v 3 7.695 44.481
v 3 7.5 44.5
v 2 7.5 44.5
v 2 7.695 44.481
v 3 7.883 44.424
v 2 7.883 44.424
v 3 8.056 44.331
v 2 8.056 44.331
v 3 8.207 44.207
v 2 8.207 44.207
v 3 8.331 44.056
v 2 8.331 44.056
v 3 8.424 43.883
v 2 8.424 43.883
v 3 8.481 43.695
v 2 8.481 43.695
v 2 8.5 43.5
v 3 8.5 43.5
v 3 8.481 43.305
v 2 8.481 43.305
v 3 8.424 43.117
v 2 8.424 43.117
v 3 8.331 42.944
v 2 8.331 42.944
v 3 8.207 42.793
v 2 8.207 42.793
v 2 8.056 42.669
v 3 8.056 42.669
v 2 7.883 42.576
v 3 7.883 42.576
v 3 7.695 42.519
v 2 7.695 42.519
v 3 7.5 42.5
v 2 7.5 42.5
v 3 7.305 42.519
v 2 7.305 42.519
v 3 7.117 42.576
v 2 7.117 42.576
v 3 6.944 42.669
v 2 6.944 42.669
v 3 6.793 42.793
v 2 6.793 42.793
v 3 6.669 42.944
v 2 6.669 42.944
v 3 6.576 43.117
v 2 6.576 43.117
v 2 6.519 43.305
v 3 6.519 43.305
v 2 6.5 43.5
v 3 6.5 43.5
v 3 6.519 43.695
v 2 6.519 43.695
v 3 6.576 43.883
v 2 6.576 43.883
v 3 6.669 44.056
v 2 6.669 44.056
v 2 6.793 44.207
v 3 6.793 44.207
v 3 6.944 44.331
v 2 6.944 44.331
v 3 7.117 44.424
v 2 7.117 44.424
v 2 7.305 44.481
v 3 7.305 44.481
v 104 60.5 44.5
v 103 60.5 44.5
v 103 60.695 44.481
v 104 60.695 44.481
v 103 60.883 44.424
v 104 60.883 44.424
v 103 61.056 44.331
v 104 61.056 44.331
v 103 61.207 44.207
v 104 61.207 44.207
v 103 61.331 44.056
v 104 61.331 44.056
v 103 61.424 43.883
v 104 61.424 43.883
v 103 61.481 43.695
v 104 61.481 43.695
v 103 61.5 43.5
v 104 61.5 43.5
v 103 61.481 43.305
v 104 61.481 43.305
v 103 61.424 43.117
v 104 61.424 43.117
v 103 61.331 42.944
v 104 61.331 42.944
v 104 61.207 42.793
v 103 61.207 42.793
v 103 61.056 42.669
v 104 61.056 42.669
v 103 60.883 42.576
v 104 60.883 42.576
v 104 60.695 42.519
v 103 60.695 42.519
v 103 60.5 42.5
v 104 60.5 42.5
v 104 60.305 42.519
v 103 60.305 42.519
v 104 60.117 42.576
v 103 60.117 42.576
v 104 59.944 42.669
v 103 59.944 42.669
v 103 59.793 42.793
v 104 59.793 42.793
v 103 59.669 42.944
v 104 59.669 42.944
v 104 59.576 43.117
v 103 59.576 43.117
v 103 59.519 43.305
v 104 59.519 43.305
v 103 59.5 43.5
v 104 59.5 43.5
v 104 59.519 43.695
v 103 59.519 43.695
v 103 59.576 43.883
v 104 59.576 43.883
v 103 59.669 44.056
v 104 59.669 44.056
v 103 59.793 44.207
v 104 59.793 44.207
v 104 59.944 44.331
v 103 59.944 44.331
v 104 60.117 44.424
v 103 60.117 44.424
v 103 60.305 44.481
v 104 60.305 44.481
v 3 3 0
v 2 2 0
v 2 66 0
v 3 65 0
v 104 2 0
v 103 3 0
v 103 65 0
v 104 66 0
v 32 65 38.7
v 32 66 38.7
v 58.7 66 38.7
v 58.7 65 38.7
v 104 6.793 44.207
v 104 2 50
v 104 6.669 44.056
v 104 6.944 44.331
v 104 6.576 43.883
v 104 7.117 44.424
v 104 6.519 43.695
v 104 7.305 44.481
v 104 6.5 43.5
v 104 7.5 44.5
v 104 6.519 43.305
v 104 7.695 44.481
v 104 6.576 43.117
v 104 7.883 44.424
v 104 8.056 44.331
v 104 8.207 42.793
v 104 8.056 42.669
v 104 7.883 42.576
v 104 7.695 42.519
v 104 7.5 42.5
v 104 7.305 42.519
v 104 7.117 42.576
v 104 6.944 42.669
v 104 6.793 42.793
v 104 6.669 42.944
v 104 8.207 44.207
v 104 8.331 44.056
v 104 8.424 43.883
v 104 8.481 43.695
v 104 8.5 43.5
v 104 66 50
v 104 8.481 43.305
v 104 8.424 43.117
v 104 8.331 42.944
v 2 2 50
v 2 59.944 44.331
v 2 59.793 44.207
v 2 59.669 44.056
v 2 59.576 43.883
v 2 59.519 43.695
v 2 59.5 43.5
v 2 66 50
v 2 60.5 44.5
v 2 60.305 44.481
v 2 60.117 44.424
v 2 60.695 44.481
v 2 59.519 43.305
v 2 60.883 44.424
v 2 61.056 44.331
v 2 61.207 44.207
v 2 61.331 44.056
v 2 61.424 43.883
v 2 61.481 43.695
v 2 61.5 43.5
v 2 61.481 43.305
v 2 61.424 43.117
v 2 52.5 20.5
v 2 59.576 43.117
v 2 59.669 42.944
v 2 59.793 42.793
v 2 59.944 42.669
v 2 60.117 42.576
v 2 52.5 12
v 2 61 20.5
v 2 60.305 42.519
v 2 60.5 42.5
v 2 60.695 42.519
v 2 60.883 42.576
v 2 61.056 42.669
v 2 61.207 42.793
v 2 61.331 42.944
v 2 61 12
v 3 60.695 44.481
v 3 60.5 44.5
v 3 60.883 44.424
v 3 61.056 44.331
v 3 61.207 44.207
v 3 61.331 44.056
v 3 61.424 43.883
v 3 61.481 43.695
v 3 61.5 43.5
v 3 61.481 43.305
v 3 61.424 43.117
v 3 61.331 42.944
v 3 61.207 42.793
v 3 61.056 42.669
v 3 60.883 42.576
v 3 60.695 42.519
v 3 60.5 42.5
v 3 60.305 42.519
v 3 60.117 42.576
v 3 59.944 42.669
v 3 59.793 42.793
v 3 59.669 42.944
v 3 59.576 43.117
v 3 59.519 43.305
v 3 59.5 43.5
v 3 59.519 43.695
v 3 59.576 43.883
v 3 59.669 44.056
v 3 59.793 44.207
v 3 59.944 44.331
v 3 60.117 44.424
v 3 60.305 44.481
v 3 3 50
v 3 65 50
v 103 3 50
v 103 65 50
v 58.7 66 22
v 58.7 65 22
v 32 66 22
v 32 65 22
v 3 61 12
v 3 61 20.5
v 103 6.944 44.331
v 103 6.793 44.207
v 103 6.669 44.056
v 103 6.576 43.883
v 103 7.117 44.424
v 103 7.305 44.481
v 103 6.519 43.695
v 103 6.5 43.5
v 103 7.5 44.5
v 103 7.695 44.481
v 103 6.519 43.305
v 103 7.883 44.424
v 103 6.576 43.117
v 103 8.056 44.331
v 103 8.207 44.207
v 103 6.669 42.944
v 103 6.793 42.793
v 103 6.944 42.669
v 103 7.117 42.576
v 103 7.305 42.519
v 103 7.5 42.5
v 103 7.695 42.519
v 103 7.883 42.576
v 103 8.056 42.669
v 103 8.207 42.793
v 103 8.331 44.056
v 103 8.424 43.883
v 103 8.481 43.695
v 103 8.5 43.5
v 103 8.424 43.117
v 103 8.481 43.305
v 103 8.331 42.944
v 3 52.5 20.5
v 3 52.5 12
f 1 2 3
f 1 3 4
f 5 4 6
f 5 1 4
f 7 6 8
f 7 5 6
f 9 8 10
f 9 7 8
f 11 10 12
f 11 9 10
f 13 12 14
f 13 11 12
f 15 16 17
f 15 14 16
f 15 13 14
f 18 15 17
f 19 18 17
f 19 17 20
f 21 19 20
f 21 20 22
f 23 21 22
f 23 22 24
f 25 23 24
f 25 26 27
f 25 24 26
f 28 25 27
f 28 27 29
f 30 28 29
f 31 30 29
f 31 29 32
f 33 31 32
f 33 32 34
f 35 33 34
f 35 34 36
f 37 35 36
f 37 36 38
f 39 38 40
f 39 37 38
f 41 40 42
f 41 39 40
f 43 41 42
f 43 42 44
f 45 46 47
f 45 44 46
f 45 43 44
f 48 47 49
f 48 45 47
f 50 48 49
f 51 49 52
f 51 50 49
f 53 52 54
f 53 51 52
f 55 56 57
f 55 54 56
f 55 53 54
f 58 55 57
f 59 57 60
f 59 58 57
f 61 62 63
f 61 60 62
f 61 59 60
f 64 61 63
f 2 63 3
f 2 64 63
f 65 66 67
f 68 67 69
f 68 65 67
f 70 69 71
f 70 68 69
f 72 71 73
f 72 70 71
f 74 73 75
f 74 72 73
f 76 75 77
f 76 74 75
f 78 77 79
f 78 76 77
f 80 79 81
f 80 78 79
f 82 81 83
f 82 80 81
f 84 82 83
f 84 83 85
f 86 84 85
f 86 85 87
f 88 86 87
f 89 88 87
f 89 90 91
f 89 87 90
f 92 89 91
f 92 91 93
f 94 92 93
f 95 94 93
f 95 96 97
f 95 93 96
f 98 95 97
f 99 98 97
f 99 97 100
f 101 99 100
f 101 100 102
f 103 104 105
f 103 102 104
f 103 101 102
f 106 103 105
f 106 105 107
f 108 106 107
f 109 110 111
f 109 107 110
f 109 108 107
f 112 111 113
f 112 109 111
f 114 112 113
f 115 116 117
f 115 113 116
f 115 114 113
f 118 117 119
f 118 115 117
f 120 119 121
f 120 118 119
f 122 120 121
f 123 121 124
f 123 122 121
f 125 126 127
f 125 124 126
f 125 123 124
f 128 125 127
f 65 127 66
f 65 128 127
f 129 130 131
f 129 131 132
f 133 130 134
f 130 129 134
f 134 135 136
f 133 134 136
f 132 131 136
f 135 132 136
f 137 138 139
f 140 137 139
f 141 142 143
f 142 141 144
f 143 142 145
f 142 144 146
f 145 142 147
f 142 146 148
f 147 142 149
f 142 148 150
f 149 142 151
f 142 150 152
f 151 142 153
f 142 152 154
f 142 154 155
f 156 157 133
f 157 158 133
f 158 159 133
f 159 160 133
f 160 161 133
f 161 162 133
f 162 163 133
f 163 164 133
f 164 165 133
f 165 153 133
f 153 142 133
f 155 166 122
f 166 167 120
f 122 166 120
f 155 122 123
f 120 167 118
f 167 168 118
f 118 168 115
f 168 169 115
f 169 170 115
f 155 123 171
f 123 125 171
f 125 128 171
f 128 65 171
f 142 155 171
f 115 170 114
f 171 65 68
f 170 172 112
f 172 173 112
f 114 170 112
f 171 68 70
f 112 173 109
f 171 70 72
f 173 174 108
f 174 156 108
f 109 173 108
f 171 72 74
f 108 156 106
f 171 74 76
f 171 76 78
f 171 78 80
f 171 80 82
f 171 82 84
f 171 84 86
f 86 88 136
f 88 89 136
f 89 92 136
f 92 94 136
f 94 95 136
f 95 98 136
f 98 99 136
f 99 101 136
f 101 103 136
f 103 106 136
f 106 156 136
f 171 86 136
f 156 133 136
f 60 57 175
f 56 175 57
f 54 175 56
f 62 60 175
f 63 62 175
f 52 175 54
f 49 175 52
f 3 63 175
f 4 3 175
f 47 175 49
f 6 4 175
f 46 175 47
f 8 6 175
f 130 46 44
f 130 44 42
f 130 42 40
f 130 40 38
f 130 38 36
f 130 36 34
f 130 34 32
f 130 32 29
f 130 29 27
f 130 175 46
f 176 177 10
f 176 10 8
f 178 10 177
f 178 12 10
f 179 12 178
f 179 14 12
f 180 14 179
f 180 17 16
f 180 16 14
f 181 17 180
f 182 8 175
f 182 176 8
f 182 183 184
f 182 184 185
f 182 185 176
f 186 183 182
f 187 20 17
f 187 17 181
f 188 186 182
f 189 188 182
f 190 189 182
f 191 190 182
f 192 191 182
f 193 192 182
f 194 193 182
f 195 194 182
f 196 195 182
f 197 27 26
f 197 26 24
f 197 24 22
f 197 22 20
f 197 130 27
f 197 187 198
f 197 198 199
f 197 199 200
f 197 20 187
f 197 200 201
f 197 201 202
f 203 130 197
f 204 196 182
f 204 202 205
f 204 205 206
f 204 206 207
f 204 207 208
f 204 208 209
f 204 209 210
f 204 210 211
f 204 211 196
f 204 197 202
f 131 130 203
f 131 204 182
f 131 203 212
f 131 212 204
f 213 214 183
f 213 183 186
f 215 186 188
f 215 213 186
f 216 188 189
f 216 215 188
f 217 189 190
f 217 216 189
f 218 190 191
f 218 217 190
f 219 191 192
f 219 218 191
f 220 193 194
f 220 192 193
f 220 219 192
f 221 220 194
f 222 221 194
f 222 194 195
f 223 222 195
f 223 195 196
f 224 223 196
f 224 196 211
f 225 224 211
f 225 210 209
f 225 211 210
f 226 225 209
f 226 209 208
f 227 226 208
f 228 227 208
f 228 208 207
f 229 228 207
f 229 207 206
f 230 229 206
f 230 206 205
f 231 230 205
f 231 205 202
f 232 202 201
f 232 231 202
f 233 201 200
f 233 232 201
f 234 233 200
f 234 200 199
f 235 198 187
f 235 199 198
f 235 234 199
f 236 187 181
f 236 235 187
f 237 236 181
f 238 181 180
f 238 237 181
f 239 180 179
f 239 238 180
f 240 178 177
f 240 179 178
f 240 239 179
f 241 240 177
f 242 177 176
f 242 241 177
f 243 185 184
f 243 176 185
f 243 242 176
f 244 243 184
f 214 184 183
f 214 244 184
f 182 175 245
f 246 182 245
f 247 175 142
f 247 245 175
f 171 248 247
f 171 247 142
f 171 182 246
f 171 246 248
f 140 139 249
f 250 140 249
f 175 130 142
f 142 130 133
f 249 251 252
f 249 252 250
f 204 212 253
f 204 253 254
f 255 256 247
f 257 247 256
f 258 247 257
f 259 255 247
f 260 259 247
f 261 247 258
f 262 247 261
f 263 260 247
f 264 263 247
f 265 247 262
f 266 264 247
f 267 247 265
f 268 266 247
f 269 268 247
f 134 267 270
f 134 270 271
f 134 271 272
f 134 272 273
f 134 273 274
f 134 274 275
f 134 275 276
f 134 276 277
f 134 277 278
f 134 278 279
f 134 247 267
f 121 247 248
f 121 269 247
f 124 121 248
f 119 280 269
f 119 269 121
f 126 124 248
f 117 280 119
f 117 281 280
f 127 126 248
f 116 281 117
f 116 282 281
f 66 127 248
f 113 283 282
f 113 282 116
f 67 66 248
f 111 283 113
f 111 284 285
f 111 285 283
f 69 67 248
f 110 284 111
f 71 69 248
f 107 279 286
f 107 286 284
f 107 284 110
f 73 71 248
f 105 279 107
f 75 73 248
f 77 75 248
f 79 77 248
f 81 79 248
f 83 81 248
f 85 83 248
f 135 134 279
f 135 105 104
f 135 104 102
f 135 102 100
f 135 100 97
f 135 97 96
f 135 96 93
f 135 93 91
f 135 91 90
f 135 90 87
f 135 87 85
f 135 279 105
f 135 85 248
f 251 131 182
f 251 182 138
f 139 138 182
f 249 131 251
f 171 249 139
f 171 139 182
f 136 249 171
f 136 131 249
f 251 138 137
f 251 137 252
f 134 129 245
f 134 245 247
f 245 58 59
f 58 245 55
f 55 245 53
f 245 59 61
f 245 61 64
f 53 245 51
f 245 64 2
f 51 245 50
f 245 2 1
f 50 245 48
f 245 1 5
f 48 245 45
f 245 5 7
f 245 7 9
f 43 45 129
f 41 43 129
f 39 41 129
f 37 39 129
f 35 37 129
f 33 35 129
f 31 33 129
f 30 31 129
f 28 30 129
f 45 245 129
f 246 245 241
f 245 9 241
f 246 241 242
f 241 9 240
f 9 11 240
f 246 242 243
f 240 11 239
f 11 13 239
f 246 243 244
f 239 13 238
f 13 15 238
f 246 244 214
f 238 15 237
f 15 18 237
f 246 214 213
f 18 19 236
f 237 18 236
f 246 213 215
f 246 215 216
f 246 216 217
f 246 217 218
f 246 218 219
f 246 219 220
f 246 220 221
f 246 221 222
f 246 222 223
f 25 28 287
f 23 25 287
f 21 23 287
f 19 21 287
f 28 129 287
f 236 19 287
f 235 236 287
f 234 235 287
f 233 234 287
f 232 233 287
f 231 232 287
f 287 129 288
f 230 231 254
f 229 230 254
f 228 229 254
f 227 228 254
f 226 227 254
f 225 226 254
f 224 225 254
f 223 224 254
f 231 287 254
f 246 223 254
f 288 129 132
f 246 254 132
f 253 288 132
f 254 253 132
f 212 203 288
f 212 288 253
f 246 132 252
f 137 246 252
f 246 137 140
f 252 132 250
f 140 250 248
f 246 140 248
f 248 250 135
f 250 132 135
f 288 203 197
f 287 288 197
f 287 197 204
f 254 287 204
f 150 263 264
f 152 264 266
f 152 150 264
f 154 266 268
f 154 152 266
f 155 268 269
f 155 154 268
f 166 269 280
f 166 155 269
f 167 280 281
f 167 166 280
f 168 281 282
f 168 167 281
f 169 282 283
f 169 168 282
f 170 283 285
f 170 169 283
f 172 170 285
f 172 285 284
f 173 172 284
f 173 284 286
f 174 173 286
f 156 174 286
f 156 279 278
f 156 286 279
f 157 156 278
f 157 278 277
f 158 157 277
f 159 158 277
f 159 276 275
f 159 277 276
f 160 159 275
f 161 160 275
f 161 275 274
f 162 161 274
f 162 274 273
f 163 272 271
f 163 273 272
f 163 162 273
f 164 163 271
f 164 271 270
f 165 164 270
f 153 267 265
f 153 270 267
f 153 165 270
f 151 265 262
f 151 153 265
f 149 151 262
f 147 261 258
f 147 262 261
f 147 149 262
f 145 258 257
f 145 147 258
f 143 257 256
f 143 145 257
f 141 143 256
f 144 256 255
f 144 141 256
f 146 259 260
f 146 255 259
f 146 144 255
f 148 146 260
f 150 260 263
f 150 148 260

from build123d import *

# Parameters (mm, degrees)
SKETCH_1_W               = 102
SKETCH_1_H               = 64
SKETCH_1_W_2             = 100
SKETCH_1_H_2             = 62
EXTRUDE_1_DEPTH          = 50
CUT_EXTRUDE_2_DEPTH      = 102
CUT_EXTRUDE_2_DEPTH_BACK = 1
SKETCH_5_R               = 1
SKETCH_7_W               = 8.5
SKETCH_7_H               = 8.5
CUT_EXTRUDE_4_DEPTH      = 10
SKETCH_8_W               = 26.7
SKETCH_8_H               = 16.7
CUT_EXTRUDE_5_DEPTH      = 10


with BuildPart() as part:
    # Эскиз1 → Бобышка-Вытянуть1 (new body)
    with BuildSketch(Plane.XY):
        with Locations((53, 34)):
            Rectangle(SKETCH_1_W, SKETCH_1_H)
        with Locations((53, 34)):
            Rectangle(SKETCH_1_W_2, SKETCH_1_H_2, mode=Mode.SUBTRACT)
    extrude(amount=EXTRUDE_1_DEPTH)

    # Эскиз5 → Вырез-Вытянуть2 (cut, two sides: drawn at the far end of the back side and taken through both)
    with BuildSketch(Plane.ZY.offset(-103).offset(-CUT_EXTRUDE_2_DEPTH_BACK)):
        with Locations((43.5, 7.5)):
            Circle(SKETCH_5_R)
        with Locations((43.5, 60.5)):
            Circle(SKETCH_5_R)
    extrude(amount=CUT_EXTRUDE_2_DEPTH + CUT_EXTRUDE_2_DEPTH_BACK, mode=Mode.SUBTRACT)

    # Эскиз7 → Вырез-Вытянуть4 (cut)
    with BuildSketch(Plane.ZY.offset(-2)):
        with Locations((16.25, 56.75)):
            Rectangle(SKETCH_7_W, SKETCH_7_H)
    extrude(amount=-CUT_EXTRUDE_4_DEPTH, mode=Mode.SUBTRACT)

    # Эскиз8 → Вырез-Вытянуть5 (cut)
    with BuildSketch(Plane(origin=(0, 66, 0), x_dir=(1, 0, 0), z_dir=(0, 1, 0))):
        with Locations((45.35, -30.35)):
            Rectangle(SKETCH_8_W, SKETCH_8_H)
    extrude(amount=-CUT_EXTRUDE_5_DEPTH, mode=Mode.SUBTRACT)


solid = part.part
